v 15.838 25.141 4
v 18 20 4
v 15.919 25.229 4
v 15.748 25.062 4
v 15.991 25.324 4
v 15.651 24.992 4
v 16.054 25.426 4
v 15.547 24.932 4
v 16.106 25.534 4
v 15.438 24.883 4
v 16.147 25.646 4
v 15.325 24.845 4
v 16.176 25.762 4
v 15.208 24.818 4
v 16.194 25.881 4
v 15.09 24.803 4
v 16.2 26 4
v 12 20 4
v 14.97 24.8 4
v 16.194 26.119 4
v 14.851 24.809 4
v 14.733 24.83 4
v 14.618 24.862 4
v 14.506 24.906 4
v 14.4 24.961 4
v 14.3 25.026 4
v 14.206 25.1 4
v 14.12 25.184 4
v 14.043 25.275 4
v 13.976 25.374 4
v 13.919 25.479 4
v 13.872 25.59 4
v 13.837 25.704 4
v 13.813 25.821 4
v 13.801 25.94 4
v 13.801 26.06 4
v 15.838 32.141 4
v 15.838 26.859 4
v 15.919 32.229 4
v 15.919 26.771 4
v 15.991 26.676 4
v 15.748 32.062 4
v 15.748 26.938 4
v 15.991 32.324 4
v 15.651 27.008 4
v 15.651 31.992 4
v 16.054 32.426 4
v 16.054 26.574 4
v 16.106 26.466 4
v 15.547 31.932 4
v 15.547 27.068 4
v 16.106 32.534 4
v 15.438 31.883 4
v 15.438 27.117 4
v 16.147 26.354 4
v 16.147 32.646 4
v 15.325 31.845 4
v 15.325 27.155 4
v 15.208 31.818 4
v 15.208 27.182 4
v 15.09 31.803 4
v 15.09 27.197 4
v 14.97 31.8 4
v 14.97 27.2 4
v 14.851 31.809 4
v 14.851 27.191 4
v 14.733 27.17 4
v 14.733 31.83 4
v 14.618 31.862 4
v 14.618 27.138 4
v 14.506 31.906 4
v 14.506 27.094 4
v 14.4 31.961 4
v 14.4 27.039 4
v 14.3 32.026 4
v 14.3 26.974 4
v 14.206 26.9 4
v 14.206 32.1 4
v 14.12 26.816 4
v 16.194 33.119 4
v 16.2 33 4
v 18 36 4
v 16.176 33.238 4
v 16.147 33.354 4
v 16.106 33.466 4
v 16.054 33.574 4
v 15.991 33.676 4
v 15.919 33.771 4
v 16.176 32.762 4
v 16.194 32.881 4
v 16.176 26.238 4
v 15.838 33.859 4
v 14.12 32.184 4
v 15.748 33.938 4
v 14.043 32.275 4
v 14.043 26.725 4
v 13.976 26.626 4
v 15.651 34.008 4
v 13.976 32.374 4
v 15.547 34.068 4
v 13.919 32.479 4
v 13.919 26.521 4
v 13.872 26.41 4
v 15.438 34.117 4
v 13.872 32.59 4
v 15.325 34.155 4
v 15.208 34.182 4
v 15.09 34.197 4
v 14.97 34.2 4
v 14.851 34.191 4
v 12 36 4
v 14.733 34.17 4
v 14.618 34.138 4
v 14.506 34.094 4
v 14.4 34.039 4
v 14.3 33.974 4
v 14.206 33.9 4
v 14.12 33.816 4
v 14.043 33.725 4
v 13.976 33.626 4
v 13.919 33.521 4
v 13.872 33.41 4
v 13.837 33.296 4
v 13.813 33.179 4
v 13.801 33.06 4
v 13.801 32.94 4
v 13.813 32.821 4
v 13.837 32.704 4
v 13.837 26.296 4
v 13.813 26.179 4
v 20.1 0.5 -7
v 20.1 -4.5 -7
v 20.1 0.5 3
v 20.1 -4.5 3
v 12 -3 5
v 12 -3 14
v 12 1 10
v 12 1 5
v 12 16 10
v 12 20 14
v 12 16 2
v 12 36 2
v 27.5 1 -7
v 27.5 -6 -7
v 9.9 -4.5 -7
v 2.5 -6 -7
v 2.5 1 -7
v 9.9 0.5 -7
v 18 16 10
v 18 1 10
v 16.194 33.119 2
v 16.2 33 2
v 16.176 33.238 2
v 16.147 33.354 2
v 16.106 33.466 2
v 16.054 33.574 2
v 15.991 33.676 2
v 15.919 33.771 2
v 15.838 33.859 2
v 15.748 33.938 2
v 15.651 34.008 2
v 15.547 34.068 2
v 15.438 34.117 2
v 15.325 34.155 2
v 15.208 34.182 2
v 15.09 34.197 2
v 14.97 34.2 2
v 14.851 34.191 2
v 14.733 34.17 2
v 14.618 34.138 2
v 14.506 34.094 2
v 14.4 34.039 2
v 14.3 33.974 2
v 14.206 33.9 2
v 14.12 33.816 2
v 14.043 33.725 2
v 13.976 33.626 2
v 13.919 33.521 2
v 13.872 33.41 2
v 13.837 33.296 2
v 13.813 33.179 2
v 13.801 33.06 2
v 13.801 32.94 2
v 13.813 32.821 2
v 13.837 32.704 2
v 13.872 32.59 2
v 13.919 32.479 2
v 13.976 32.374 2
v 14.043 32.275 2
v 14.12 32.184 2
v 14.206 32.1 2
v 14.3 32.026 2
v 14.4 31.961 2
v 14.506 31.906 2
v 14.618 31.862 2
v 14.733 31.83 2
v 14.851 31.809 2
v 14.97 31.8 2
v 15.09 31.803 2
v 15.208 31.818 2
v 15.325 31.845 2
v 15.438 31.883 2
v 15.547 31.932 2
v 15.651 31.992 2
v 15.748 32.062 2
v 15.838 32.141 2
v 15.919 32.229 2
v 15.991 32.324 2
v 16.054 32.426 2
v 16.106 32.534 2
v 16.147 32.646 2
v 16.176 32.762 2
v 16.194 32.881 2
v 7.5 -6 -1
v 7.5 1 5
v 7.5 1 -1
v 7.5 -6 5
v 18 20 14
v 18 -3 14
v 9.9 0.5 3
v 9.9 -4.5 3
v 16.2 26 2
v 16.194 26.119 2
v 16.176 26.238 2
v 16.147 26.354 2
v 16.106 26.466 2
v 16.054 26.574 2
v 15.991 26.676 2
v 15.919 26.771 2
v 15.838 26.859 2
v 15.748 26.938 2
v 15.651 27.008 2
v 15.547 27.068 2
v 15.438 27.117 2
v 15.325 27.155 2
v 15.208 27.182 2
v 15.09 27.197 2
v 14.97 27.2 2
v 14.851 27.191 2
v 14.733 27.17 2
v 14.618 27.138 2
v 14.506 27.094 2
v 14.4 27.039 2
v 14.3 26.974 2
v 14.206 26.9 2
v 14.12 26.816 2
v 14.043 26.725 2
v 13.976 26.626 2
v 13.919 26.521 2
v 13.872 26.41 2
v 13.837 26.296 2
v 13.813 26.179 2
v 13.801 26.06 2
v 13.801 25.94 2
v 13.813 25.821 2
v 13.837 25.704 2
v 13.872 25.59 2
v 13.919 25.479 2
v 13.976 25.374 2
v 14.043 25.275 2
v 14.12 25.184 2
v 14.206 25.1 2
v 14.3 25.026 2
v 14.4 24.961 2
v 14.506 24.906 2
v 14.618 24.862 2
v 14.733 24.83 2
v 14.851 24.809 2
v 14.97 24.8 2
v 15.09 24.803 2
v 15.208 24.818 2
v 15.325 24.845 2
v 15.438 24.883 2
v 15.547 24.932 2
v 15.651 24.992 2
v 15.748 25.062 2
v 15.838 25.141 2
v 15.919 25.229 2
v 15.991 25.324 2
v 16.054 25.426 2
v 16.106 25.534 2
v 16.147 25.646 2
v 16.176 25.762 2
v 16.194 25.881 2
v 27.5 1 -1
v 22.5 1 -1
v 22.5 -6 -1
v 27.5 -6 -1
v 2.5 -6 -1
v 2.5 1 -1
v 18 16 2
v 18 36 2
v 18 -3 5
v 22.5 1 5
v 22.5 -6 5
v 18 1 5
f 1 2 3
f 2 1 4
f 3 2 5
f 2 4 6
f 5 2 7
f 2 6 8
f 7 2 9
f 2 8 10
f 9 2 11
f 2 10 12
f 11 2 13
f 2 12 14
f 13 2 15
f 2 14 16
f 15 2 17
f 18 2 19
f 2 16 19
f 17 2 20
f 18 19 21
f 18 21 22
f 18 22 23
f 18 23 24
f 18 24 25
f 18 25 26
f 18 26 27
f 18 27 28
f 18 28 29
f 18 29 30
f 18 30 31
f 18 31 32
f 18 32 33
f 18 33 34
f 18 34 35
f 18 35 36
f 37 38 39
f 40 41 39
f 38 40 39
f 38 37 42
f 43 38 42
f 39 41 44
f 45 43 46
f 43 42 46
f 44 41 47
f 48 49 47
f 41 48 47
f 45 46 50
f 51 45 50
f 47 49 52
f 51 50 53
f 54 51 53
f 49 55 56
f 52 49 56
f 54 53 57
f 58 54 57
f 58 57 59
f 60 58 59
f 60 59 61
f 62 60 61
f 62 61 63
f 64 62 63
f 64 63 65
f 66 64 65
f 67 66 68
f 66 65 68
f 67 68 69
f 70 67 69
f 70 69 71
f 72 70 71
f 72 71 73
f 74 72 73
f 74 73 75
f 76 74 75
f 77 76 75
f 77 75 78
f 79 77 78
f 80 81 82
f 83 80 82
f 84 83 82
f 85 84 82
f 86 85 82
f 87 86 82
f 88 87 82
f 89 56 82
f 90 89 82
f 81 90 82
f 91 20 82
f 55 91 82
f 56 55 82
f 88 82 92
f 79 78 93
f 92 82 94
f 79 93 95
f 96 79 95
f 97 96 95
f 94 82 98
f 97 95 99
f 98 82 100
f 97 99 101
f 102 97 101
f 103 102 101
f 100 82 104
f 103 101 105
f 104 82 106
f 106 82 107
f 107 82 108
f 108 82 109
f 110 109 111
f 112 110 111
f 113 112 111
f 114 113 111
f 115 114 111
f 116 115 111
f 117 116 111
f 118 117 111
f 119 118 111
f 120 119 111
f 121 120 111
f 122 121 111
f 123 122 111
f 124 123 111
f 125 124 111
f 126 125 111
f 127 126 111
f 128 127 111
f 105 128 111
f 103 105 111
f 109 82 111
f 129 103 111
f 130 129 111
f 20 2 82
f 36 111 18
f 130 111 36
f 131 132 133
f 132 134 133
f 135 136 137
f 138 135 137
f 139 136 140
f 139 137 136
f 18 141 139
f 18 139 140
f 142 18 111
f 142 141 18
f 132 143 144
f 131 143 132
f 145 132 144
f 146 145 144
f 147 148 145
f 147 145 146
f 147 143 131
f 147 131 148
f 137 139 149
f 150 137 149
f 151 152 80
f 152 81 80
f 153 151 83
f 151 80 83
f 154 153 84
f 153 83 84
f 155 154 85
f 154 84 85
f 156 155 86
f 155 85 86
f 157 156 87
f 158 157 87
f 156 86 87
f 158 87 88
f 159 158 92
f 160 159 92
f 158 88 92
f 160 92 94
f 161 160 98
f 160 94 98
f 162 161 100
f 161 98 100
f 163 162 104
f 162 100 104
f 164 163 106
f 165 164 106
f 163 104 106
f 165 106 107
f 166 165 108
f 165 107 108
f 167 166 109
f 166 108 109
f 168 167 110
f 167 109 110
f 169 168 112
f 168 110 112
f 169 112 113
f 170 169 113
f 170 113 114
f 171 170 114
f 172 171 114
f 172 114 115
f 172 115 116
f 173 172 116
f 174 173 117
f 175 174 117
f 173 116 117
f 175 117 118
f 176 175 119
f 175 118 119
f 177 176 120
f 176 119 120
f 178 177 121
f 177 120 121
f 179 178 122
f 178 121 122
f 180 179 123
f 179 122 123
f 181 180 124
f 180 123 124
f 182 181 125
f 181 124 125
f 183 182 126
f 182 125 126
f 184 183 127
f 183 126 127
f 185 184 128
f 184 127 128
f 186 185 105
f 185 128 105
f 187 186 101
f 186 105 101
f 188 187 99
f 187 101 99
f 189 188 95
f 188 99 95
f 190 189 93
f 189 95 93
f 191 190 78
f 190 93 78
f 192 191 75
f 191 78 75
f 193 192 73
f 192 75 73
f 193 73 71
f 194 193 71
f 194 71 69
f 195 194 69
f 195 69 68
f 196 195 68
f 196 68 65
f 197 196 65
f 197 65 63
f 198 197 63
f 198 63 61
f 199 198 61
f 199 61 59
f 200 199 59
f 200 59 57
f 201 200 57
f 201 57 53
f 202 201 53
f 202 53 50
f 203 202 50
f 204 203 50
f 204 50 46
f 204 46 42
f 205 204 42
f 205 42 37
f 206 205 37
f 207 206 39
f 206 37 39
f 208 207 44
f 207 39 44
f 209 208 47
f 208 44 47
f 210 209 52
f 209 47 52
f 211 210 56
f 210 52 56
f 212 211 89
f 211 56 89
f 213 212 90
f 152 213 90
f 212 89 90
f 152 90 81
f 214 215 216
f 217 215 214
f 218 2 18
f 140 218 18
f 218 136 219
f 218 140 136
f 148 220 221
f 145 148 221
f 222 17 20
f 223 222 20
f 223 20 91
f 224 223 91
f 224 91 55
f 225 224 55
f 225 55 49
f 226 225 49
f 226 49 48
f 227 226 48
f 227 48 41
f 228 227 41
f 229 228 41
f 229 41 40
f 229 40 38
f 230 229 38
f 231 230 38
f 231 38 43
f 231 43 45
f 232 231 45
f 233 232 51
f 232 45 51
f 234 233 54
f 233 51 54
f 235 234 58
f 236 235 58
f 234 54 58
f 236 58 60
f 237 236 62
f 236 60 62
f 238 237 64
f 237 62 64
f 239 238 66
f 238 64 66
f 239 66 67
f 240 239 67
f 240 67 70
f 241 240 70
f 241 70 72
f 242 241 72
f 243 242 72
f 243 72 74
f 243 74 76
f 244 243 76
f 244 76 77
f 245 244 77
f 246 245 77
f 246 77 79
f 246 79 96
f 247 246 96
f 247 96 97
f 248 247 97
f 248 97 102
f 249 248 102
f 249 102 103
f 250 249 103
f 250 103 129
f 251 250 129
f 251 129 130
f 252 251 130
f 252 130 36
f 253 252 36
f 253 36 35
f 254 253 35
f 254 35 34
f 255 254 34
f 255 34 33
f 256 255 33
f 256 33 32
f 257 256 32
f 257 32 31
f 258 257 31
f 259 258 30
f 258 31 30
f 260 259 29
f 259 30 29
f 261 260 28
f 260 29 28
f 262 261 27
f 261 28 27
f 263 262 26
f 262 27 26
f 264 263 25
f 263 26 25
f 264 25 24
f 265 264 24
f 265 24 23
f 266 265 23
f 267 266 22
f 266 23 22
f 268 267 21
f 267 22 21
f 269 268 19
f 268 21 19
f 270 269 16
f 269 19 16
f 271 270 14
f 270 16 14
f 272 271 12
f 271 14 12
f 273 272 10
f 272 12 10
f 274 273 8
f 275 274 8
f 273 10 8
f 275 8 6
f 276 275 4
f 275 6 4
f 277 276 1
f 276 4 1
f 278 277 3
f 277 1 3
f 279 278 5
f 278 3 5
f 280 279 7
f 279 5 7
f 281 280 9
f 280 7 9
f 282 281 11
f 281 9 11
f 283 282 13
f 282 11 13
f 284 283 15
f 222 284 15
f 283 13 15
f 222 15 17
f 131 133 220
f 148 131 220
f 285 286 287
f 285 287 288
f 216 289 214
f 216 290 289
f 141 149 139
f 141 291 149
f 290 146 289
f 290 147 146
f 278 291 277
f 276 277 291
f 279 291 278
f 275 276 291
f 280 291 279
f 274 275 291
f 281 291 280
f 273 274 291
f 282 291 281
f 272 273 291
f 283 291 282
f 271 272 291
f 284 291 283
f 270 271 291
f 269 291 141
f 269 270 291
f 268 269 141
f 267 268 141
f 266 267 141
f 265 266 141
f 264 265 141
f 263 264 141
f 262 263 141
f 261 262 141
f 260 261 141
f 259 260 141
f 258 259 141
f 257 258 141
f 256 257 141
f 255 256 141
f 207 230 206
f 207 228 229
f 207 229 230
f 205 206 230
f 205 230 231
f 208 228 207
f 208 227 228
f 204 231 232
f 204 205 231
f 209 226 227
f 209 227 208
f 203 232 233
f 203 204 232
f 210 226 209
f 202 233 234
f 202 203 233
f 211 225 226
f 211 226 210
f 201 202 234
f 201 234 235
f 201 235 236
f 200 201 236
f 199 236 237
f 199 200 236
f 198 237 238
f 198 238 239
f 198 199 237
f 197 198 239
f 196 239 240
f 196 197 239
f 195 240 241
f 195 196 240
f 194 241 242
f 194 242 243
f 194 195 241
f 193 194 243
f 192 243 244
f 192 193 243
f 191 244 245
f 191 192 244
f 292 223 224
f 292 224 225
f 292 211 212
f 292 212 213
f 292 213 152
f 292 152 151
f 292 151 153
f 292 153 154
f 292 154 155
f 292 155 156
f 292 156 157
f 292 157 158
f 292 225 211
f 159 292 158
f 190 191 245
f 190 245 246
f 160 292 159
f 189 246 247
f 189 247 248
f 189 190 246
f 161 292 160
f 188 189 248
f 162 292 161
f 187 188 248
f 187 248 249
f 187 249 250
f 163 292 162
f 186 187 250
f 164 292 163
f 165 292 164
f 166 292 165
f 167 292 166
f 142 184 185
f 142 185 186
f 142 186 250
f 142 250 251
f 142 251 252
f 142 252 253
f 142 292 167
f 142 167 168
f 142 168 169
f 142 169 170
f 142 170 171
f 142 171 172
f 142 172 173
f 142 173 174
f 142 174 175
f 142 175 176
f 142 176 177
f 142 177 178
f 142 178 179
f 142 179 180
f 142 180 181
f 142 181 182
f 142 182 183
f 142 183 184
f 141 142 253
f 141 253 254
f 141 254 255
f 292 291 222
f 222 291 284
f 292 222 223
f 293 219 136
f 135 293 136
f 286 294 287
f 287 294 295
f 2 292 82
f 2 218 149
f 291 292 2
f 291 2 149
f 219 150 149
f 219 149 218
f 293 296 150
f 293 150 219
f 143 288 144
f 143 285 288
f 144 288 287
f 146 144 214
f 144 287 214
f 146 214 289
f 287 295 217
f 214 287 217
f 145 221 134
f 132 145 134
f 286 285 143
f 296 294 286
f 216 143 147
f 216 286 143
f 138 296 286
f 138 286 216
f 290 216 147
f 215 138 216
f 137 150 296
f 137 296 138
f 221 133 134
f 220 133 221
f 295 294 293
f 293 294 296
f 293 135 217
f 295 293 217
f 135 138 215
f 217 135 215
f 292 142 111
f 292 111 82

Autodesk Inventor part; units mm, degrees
ref_plane "YZ Plane" through (0, 0, 0) normal (1, 0, 0) x (0, 1, 0)
ref_plane "XZ Plane" through (0, 0, 0) normal (0, 1, 0) x (-1, 0, 0)
ref_plane "XY Plane" through (0, 0, 0) normal (0, 0, 1) x (1, 0, 0)
sketch "스케치1" plane through (0, 0, 0) normal (0, 0, 1) x (1, 0, 0)
  line L0 (0, 0) -> (30, 0)
  line L1 (30, 0) -> (30, 20)
  line L2 (30, 20) -> (0, 20)
  line L3 (0, 20) -> (0, 0)
  line L4 (0, 20) -> (30, 20)
  line L5 (30, 20) -> (30, 17)
  line L6 (0, 17) -> (0, 20)
  line L7 (12, 20) -> (18, 20)
  line L8 (18, 20) -> (18, 16)
  line L9 (18, 16) -> (12, 16)
  line L10 (12, 16) -> (12, 20)
  point P0 (15, 20)
  point P1 (15, 20)
  dimension "d0" = 20
  dimension "d1" = 30
  dimension "d2" = 3
  dimension "d3" = 6
  dimension "d4" = 4
extrude "돌출1" add sketch "스케치1" along normal blind 10 contours L2 L8 L9 L10
sketch "스케치2" plane through (0, 0, 10) normal (0, 0, 1) x (1, 0, 0)
  line L0 (18, 20) -> (12, 20) projected
  line L1 (12, 20) -> (18, 20)
  line L2 (18, 20) -> (18, -3)
  line L3 (18, -3) -> (12, -3)
  line L4 (12, -3) -> (12, 20)
  point P0 (0, 0)
  dimension "d23" = 23
extrude "돌출2" add sketch "스케치2" along normal blind 4
sketch "스케치3" plane through (0, 0, 10) normal (0, 0, -1) x (-1, 0, 0)
  line L0 (-18, -3) -> (-18, 16) projected
  line L1 (-12, 16) -> (-12, -3) projected
  line L2 (-18, -3) -> (-12, -3)
  line L3 (-12, -3) -> (-12, 1)
  line L4 (-12, 1) -> (-18, 1)
  line L5 (-18, 1) -> (-18, -3)
  point P0 (0, 0)
  dimension "d9" = 4
extrude "돌출3" add sketch "스케치3" along normal blind 15
sketch "스케치6" plane through (0, 0, 0) normal (0, 0, -1) x (-1, 0, 0)
  line L0 (-18, 16) -> (-18, 20) projected
  line L1 (-12, 16) -> (-18, 16) projected
  line L2 (-12, 20) -> (-12, 16) projected
  line L3 (-18, 20) -> (-12, 20) projected
  line L4 (-18, 16) -> (-18, 20) projected
  line L5 (-18, 16) -> (-12, 16)
  line L6 (-12, 16) -> (-12, 36)
  line L7 (-12, 36) -> (-18, 36)
  line L8 (-18, 36) -> (-18, 16)
  point P0 (0, 0)
  dimension "d20" = 20
extrude "돌출6" add sketch "스케치6" against normal blind 4 contours L8 L7 L6 L3
sketch "스케치7" plane through (12, 1, 10) normal (0, 1, 0) x (1, 0, 0)
  line L0 (6, 0) -> (0, 0) projected
  line L1 (6, 0) -> (6, 15) projected
  line L2 (0, 15) -> (6, 15) projected
  line L3 (0, 0) -> (0, 15) projected
  line L4 (-4.5, 15) -> (10.5, 15)
  line L5 (10.5, 15) -> (10.5, 10)
  line L6 (10.5, 10) -> (-4.5, 10)
  line L7 (-4.5, 10) -> (-4.5, 15)
  point P0 (-12, 10)
  point P1 (3, 15)
  point P2 (3, 15)
  point P3 (6, 15)
  point P4 (6, 10)
  point P5 (0, 10)
  dimension "d27" = 15
extrude "돌출7" add sketch "스케치7" against normal blind 4 contours L1 L4 L5 L6 | L6 L7 L4 L3
sketch "스케치8" plane through (0, 0, -5) normal (0, 0, -1) x (-1, 0, 0)
  line L0 (-22.5, 1) -> (-7.5, 1) projected
  line L1 (-22.5, 1) -> (-22.5, -3) projected
  line L2 (-7.5, -3) -> (-22.5, -3) projected
  line L3 (-7.5, 1) -> (-7.5, -3) projected
  line L4 (-22.5, 1) -> (-7.5, 1)
  line L5 (-7.5, 1) -> (-7.5, -6)
  line L6 (-7.5, -6) -> (-22.5, -6)
  line L7 (-22.5, -6) -> (-22.5, 1)
  point P0 (0, 0)
  dimension "d28" = 7
extrude "돌출8" add sketch "스케치8" against normal blind 10
sketch "스케치9" plane through (0, 0, -5) normal (0, 0, -1) x (-1, 0, 0)
  line L0 (-20.1, 0.5) -> (-9.9, 0.5)
  line L1 (-9.9, 0.5) -> (-9.9, -4.5)
  line L2 (-9.9, -4.5) -> (-20.1, -4.5)
  line L3 (-20.1, -4.5) -> (-20.1, 0.5)
  line L4 (-22.5, 1) -> (-7.5, 1) projected
  line L5 (-22.5, 1) -> (-22.5, -6) projected
  point P0 (0, 0)
  point P1 (-15, 1)
  point P2 (-15, 0.5)
  dimension "d31" = 10.2
  dimension "d32" = 5
  dimension "d33" = 0.5
extrude "돌출9" cut sketch "스케치9" against normal blind 8
sketch "스케치10" plane through (0, 0, -5) normal (0, 0, -1) x (-1, 0, 0)
  line L0 (-9.9, 0.5) -> (-9.9, -4.5) projected
  line L1 (-9.9, -4.5) -> (-20.1, -4.5) projected
  line L2 (-20.1, -4.5) -> (-20.1, 0.5) projected
  line L3 (-20.1, 0.5) -> (-9.9, 0.5) projected
  line L4 (-22.5, 1) -> (-7.5, 1) projected
  line L5 (-22.5, 1) -> (-22.5, -6) projected
  line L6 (-22.5, -6) -> (-7.5, -6) projected
  line L7 (-7.5, 1) -> (-7.5, -6) projected
  point P0 (0, 0)
extrude "돌출10" add sketch "스케치10" along normal blind 2
sketch "스케치11" plane through (12, 1, 10) normal (0, 1, 0) x (1, 0, 0)
  line L0 (0, 0) -> (0, 5) projected
  line L1 (6, 0) -> (0, 0) projected
  line L2 (6, 0) -> (6, 5) projected
  line L3 (10.5, 5) -> (6, 5) projected
  line L4 (10.5, 5) -> (10.5, 17) projected
  line L5 (-4.5, 17) -> (10.5, 17) projected
  line L6 (-4.5, 17) -> (-4.5, 5) projected
  line L7 (0, 5) -> (-4.5, 5) projected
  line L8 (-9.5, 11) -> (15.5, 11)
  line L9 (15.5, 11) -> (15.5, 17)
  line L10 (15.5, 17) -> (-9.5, 17)
  line L11 (-9.5, 17) -> (-9.5, 11)
  line L12 (0, 5) -> (6, 5) projected
  point P0 (-12, 10)
  point P1 (3, 11)
  point P2 (3, 5)
  point P3 (10.5, 17)
  point P4 (10.5, 11)
  point P5 (-4.5, 11)
  dimension "d39" = 25
  dimension "d40" = 6
extrude "돌출11" add sketch "스케치11" against normal blind 7 contours L8 L11 L10 L6 | L4 L10 L9 L8
sketch "스케치12" plane through (0, 0, 0) normal (0, 0, -1) x (-1, 0, 0)
  line L0 (-12, 16) -> (-12, 36) projected
  line L1 (-18, 16) -> (-18, 36) projected
  line L2 (-12, 16) -> (-18, 16) projected
  line L3 (-12, 16) -> (-12, 36) projected
  line L4 (-12, 36) -> (-18, 36) projected
  point P0 (0, 0)
extrude "돌출12" cut sketch "스케치12" against normal blind 2
sketch "스케치13" plane through (0, 0, 4) normal (0, 0, 1) x (1, 0, 0)
  line L0 (18, 20) -> (18, 36) projected
  line L1 (18, 36) -> (12, 36) projected
  line L2 (12, 36) -> (12, 20) projected
  line L3 (18, 20) -> (12, 20) projected
  circle A0 centre (15, 33) radius 1.2
  circle A1 centre (15, 26) radius 1.2
  point P0 (0, 0)
  point P1 (15, 36)
  dimension "d45" = 2.4
  dimension "d48" = 3
  dimension "d51" = 7
extrude "돌출13" cut sketch "스케치13" against normal blind 2 contours A0 | A1
sketch "스케치16" plane through (0, 0, 2) normal (0, 0, -1) x (-1, 0, 0)
  circle A0 centre (-15, 19) radius 2.3
  line L0 (-12, 16) -> (-18, 16) projected
  point P0 (0, 0)
  point P1 (-15, 16)
  dimension "d59" = 4.6
  dimension "d60" = 3
properties part number "final522"
